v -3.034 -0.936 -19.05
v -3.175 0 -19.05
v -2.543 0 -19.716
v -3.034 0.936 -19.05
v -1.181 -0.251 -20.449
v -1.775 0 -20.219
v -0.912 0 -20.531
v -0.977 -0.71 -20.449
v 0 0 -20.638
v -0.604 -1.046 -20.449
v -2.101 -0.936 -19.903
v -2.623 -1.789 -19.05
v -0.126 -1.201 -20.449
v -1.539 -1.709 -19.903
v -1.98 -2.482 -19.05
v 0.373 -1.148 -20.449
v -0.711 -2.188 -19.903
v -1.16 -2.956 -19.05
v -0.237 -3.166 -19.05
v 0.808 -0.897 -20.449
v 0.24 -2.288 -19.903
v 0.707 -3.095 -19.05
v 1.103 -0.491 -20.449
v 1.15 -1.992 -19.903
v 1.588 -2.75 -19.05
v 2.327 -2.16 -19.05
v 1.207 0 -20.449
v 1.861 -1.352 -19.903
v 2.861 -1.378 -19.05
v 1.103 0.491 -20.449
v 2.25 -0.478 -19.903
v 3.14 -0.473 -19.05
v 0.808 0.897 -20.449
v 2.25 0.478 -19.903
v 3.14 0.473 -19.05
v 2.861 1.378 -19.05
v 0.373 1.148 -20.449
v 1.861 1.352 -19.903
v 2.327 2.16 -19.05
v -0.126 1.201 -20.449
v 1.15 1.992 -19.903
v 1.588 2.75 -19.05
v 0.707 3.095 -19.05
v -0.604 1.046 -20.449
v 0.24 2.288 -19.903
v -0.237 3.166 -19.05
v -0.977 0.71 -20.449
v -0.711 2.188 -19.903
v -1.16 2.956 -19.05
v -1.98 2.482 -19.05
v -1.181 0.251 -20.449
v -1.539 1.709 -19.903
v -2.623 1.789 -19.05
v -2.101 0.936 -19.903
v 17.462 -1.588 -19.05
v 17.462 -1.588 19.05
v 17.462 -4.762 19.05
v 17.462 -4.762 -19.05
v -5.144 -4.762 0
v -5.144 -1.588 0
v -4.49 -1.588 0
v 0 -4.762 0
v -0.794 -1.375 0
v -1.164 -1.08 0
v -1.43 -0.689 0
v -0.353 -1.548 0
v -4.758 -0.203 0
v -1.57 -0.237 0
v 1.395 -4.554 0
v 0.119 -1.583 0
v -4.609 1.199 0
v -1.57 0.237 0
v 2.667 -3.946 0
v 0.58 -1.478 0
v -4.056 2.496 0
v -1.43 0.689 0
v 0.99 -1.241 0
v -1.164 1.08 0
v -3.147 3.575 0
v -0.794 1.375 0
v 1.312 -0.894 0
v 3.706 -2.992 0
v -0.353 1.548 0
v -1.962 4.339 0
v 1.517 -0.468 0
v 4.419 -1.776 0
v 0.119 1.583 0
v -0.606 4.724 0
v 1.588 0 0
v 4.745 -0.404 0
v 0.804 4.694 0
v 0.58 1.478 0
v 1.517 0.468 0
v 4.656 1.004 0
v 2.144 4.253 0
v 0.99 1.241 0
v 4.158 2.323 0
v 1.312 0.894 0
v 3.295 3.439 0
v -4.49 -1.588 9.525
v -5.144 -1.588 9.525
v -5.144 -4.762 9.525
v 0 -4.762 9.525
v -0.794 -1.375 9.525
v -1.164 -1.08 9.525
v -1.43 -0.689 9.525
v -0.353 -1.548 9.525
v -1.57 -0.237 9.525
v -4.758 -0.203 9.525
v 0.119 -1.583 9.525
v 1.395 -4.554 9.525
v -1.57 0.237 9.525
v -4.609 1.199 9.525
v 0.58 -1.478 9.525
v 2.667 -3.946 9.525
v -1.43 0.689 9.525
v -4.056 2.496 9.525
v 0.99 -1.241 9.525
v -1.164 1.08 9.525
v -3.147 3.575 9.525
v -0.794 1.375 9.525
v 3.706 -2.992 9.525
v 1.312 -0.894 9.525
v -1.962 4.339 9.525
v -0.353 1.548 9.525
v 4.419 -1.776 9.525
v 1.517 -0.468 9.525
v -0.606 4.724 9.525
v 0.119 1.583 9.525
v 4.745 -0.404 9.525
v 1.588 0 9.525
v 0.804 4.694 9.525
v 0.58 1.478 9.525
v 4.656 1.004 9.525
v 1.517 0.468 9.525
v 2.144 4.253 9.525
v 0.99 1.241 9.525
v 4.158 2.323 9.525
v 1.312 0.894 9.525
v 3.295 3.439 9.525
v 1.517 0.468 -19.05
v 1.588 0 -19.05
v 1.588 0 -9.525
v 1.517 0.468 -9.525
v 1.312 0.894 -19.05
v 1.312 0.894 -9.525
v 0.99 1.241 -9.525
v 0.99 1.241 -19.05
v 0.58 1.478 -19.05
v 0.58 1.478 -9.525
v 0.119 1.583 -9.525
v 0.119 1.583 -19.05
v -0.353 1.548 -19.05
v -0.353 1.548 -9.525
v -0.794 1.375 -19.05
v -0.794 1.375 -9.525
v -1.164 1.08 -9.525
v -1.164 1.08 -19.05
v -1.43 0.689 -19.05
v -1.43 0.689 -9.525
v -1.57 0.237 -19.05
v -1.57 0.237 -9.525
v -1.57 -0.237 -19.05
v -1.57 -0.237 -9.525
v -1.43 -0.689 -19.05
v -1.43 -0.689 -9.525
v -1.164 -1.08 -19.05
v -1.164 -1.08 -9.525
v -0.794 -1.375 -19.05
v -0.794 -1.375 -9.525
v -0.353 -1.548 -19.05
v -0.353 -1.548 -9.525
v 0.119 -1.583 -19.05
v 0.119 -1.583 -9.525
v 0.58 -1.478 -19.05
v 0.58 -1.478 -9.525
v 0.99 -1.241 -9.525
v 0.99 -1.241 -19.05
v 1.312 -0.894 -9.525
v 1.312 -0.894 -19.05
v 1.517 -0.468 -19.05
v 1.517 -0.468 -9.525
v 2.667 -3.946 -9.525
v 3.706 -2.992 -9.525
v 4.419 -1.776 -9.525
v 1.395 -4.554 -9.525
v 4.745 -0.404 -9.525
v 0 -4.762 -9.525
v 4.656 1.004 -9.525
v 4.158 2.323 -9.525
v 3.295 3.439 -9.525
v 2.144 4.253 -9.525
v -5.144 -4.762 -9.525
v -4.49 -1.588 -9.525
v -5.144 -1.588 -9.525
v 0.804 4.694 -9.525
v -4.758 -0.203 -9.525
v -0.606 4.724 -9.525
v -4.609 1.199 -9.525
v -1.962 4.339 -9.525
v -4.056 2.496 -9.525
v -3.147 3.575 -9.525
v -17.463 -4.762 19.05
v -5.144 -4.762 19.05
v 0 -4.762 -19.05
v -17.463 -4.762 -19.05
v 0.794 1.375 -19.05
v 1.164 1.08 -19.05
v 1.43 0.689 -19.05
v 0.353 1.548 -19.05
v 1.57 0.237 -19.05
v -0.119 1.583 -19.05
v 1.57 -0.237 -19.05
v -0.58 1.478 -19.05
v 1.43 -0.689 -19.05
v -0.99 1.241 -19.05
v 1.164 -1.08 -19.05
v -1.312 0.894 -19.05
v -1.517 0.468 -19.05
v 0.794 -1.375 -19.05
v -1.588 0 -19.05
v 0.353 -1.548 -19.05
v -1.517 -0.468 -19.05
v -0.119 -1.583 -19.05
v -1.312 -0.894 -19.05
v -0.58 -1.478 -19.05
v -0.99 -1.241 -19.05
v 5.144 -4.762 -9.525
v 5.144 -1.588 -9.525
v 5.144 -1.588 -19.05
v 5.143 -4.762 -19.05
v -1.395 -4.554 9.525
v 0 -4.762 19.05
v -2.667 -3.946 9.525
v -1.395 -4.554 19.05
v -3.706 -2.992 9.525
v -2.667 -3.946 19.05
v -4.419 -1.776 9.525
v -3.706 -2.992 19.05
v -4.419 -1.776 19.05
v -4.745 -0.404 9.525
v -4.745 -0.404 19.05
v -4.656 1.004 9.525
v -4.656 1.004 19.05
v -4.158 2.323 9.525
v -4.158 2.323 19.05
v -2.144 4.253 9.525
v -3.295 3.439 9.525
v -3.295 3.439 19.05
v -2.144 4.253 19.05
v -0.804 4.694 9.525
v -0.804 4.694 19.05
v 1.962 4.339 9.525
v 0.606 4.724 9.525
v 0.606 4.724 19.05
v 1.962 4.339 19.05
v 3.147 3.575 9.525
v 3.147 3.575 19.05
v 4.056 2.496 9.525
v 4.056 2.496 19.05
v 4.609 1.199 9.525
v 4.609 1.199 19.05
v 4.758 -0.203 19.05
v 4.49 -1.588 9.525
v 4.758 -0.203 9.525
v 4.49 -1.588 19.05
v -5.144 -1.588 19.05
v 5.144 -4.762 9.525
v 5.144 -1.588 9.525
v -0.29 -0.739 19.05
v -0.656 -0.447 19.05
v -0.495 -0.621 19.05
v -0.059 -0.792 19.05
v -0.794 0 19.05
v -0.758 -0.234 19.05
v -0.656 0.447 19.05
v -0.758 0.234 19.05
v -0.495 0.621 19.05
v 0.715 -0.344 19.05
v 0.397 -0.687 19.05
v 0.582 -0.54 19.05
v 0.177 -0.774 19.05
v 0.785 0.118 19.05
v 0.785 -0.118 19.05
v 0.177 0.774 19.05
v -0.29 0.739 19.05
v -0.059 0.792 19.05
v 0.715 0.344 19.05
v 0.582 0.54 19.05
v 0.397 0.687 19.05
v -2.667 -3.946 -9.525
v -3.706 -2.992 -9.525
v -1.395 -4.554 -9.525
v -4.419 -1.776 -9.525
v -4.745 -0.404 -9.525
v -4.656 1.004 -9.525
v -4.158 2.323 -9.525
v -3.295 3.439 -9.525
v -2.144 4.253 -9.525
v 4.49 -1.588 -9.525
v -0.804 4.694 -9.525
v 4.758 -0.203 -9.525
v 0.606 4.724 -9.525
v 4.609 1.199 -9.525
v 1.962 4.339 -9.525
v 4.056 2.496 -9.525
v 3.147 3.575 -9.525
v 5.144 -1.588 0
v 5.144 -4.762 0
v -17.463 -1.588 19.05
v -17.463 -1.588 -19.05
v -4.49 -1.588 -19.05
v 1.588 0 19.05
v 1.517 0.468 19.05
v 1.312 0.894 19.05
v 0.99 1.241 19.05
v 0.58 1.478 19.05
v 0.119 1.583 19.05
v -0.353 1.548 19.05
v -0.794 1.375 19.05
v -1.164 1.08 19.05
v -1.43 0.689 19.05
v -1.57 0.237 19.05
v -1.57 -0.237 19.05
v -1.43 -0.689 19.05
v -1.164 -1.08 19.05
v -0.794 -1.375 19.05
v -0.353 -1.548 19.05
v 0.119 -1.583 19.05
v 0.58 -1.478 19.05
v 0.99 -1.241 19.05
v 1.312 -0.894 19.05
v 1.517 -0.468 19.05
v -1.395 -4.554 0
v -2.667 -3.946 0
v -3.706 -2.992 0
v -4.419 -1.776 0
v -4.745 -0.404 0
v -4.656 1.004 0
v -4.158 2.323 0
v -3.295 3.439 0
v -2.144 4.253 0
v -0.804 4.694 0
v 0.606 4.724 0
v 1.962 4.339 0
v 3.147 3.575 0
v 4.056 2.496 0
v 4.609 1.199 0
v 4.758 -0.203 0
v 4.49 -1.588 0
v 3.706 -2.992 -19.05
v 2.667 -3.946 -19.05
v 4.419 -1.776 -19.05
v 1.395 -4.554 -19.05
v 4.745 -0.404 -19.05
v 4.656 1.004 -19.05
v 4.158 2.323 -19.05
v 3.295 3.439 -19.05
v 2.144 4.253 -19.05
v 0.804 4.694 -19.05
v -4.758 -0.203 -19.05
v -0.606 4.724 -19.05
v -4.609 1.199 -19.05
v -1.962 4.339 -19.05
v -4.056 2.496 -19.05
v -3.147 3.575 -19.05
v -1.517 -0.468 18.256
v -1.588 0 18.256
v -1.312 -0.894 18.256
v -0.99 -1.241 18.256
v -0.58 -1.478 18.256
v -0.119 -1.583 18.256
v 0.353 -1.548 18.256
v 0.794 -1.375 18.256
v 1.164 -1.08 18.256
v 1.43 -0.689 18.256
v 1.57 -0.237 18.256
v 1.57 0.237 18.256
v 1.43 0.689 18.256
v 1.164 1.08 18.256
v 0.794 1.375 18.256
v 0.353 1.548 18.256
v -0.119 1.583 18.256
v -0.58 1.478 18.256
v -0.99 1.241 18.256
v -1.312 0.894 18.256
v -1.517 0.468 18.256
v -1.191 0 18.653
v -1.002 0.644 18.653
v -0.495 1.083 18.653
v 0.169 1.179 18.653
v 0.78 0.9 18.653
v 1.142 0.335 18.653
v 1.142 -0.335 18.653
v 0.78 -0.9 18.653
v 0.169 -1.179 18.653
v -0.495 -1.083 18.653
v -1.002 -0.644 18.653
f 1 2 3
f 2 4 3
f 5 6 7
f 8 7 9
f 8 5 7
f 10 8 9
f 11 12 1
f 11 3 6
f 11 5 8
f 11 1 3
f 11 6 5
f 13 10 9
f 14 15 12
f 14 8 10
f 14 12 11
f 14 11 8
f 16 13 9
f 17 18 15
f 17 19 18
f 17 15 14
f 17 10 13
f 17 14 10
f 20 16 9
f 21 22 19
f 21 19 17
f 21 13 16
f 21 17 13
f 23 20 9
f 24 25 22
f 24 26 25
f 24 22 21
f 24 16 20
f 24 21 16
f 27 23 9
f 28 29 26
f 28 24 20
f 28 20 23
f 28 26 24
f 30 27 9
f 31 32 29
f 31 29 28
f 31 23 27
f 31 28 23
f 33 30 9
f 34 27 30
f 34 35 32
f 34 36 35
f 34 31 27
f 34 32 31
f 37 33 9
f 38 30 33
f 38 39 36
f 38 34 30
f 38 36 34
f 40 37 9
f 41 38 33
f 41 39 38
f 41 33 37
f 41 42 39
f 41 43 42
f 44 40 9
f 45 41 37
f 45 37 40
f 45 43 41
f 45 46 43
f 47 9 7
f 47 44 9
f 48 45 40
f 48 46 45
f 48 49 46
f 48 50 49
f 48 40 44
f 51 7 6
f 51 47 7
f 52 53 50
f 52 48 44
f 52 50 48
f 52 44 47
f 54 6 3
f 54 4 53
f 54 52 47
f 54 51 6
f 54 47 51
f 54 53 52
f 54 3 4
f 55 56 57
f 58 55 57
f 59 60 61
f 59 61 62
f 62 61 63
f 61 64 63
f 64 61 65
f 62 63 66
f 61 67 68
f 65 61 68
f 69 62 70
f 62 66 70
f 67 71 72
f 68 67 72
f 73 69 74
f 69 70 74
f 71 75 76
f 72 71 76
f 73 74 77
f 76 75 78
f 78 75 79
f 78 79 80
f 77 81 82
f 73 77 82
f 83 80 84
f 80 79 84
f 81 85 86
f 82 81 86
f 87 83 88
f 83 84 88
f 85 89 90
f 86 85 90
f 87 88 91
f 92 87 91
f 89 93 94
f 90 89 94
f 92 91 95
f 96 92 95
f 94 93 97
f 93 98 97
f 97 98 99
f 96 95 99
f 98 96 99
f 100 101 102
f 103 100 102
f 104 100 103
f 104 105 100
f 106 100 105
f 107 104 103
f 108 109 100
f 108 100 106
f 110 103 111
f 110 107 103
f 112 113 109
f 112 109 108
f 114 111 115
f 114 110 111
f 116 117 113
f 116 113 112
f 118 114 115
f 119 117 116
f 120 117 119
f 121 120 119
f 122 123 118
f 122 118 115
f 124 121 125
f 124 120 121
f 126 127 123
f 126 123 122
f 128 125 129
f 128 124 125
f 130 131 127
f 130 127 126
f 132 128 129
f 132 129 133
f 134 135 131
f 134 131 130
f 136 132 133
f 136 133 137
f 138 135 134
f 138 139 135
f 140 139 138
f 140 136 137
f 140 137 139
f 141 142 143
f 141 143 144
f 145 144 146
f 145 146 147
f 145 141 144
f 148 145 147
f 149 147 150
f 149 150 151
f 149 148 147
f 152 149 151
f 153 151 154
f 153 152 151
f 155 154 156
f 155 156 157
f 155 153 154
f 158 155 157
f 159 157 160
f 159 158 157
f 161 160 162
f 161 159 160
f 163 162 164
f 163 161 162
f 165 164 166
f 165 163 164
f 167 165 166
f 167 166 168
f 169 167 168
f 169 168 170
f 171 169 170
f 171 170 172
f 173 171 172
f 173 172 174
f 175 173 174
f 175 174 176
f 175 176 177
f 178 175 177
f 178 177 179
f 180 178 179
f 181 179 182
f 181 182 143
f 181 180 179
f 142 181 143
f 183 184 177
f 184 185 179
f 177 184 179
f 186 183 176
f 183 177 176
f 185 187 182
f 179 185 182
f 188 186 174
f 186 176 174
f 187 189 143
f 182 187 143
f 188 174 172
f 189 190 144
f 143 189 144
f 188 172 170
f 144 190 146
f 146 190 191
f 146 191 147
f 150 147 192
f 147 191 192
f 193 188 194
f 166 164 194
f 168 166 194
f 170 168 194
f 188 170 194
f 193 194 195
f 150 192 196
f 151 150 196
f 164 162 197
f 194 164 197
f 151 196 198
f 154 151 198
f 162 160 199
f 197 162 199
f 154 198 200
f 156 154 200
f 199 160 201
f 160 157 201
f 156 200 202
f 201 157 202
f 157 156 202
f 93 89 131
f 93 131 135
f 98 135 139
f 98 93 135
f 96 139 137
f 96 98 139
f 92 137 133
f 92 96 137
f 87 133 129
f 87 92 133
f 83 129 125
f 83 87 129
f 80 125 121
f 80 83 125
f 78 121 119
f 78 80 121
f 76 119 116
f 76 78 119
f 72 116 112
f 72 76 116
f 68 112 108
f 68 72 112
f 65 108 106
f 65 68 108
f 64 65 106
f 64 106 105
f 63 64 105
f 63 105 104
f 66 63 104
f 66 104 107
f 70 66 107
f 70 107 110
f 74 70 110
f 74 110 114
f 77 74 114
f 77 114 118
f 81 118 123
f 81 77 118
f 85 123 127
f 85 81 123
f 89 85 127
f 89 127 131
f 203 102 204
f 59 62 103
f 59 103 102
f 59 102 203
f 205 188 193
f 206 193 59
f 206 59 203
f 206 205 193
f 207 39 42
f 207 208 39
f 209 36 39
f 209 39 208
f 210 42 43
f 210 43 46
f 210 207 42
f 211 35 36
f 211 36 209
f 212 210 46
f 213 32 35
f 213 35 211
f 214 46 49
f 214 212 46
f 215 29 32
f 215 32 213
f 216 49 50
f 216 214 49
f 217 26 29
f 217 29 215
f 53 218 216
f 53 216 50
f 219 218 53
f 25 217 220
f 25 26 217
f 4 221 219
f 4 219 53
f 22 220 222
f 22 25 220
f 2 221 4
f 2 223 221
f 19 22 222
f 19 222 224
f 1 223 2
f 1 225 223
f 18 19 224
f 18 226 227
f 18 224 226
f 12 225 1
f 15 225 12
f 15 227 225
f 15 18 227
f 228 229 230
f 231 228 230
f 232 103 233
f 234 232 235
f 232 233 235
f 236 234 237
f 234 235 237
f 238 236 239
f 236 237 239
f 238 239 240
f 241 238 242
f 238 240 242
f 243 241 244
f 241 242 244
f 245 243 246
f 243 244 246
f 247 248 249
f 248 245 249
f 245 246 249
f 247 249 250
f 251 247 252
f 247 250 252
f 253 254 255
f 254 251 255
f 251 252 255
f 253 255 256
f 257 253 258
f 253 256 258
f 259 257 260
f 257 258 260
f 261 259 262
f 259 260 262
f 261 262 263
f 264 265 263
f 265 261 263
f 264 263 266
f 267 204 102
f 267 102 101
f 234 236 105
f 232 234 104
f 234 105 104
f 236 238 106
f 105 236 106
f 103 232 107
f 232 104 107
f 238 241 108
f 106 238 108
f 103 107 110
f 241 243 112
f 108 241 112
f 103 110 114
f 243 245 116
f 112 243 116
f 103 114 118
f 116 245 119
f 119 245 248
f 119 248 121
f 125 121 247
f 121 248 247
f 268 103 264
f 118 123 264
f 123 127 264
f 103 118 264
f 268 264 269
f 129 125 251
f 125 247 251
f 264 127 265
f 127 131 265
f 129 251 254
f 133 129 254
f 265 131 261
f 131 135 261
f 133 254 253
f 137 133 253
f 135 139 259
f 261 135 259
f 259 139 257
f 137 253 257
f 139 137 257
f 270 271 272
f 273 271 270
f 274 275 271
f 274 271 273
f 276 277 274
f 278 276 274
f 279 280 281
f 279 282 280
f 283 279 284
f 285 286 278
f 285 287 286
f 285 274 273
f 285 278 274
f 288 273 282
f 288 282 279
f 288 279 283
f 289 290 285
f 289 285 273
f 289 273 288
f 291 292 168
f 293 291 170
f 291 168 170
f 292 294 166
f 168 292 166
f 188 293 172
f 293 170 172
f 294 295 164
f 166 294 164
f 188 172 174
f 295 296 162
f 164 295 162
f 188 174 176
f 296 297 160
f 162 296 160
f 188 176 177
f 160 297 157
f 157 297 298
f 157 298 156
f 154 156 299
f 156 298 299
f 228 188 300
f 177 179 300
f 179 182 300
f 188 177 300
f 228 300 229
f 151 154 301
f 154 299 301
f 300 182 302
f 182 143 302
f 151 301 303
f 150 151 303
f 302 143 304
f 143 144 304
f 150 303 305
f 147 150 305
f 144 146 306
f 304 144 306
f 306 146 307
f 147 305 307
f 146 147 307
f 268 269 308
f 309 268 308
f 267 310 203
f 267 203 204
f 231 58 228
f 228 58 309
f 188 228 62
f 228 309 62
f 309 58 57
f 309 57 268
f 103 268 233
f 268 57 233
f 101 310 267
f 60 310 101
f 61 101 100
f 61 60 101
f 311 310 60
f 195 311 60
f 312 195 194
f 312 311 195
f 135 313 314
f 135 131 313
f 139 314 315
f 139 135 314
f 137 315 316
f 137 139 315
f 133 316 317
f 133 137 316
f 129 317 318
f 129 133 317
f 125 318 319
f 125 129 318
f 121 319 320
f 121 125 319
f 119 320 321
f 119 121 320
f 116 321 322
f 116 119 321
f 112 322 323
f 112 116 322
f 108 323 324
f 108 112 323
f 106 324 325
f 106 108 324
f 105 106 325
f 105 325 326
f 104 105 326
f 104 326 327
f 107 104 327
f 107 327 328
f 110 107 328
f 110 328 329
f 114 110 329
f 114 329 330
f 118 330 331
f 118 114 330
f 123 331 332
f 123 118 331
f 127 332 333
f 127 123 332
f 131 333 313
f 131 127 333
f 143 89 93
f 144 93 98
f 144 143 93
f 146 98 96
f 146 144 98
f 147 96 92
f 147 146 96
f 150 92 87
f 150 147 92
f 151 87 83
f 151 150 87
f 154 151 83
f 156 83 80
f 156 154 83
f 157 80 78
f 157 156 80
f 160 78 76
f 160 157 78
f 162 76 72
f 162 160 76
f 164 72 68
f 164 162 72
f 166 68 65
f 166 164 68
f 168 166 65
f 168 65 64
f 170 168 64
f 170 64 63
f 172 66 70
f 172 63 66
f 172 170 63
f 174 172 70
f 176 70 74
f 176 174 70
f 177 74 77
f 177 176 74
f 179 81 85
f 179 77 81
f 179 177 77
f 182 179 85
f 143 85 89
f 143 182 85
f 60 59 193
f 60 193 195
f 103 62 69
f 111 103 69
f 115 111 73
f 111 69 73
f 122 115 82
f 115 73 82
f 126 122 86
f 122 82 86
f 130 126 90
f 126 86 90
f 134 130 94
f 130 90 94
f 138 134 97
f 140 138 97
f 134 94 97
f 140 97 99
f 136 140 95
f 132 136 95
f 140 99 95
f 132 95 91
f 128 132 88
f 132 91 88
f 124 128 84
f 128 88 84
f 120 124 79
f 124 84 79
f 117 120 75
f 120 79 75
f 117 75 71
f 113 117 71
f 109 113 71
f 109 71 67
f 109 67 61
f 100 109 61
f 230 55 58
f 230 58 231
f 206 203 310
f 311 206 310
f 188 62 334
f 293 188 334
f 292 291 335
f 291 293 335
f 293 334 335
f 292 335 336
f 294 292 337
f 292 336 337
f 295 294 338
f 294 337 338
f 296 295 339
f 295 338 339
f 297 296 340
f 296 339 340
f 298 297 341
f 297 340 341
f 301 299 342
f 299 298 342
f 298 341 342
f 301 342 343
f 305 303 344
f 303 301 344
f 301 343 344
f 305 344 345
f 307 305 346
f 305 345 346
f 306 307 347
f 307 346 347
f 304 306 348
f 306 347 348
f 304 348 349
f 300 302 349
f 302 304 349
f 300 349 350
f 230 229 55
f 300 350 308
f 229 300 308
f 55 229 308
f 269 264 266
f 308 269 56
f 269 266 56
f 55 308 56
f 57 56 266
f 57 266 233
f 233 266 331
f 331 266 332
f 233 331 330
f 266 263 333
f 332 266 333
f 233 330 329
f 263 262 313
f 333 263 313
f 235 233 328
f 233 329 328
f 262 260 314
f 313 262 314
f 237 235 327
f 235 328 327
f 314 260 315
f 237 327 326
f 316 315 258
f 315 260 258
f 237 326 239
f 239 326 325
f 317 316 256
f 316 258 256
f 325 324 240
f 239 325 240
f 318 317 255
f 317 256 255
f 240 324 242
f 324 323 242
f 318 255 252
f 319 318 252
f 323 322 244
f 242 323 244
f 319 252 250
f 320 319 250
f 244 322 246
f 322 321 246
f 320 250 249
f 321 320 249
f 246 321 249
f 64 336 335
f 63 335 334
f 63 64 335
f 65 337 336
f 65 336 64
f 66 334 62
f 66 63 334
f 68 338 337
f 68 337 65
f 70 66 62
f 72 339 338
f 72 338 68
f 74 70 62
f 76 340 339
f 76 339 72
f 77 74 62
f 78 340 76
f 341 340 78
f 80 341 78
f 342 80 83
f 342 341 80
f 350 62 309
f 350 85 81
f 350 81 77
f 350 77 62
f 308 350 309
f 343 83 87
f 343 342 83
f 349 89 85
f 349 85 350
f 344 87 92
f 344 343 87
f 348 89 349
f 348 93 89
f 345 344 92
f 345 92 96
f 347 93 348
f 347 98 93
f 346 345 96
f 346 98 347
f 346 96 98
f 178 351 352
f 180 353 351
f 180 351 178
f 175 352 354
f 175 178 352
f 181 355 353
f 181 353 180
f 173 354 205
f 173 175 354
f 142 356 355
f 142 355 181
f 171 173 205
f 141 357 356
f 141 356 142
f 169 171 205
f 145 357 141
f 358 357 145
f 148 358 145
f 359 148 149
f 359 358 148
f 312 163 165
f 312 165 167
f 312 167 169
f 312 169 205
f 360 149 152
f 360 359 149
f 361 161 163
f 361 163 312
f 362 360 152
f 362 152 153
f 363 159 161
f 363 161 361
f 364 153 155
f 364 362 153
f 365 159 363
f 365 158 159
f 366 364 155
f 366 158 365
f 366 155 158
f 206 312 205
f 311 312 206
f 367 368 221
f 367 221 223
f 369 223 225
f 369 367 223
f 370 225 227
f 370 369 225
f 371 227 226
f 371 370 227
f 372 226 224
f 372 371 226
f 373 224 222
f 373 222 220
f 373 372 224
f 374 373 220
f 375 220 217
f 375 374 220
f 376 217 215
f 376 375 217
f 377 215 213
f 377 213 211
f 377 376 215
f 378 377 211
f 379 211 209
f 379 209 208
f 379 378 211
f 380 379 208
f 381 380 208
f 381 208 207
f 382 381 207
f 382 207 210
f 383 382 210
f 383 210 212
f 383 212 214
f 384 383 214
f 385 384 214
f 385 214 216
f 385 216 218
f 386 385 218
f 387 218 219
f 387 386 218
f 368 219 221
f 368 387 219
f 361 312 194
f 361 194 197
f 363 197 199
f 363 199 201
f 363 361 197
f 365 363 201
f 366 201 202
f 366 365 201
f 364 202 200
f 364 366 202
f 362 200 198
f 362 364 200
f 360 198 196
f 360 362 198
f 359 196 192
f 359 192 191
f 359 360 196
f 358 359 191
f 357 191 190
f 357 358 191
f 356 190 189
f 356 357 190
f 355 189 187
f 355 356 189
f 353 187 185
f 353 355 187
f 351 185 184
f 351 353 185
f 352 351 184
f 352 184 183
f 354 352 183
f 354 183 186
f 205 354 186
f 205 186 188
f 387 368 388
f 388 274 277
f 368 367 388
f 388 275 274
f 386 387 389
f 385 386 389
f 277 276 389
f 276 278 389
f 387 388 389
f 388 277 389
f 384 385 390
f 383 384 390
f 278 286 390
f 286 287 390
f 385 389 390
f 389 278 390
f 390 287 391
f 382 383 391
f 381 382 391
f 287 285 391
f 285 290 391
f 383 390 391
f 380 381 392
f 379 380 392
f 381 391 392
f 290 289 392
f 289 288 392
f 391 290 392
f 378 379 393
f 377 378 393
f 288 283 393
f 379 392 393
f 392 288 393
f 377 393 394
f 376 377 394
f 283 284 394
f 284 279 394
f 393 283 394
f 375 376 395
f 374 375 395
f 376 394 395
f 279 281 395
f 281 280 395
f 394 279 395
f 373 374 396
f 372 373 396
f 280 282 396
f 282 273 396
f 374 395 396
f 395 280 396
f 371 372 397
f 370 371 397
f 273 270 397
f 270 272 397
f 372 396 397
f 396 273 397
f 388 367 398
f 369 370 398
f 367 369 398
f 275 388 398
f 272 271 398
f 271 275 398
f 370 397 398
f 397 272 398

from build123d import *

# Parameters (mm, degrees)
SKETCH1_R            = 1.5875
EXTRUDE1_DEPTH       = 19.05
SKETCH1_W            = 12.319
SKETCH1_H            = 3.175
EXTRUDE1_2_DEPTH     = 19.05
SKETCH10_W           = 10.287
SKETCH10_H           = 9.525
EXTRUDE6_DEPTH       = 5.7625
EXTRUDE6_DEPTH_BACK  = 5.7625
SKETCH11_R           = 1.5875
EXTRUDE7_DEPTH       = 9.525
SKETCH12_R           = 1.5875
EXTRUDE8_DEPTH       = 9.525
SKETCH19_W           = 34.925
SKETCH19_H           = 1.5875
EXTRUDE23_DEPTH      = 5.7625
EXTRUDE23_DEPTH_BACK = 5.7625
CHAMFER1_SIZE        = 0.79375


with BuildPart() as part:
    # Sketch1 → Extrude1 (new body, symmetric)
    with BuildSketch(Plane.XY):
        with BuildLine():
            Line((17.4625, -4.7625), (0, -4.7625))
            ThreePointArc((0, -4.7625), (-2.749630657, 3.888564967), (4.490128061, -1.5875))
            Line((4.490128061, -1.5875), (17.4625, -1.5875))
            Line((17.4625, -1.5875), (17.4625, -4.7625))
        make_face()
        Circle(SKETCH1_R, mode=Mode.SUBTRACT)
    extrude(amount=EXTRUDE1_DEPTH, both=True)

    # Sketch10 → Extrude6 (cut, two sides)
    with BuildSketch(Plane(origin=(0, 0, 0), x_dir=(1, 0, 0), z_dir=(0, 1, 0))) as extrude6_sk:
        with Locations((0, 14.2875)):
            Rectangle(SKETCH10_W, SKETCH10_H)
        with Locations((0, -4.7625)):
            Rectangle(SKETCH10_W, SKETCH10_H)
    extrude(amount=EXTRUDE6_DEPTH, mode=Mode.SUBTRACT)
    extrude(extrude6_sk.sketch, amount=-EXTRUDE6_DEPTH_BACK, mode=Mode.SUBTRACT)


with BuildPart() as body_2:
    # Sketch1 → Extrude1 2 (new body, symmetric)
    with BuildSketch(Plane.XY):
        with Locations((-11.303, -3.175)):
            Rectangle(SKETCH1_W, SKETCH1_H)
    extrude(amount=EXTRUDE1_2_DEPTH, both=True)

    # Sketch11 → Extrude7 (add)
    with BuildSketch(Plane.XY.offset(-19.05)):
        with BuildLine():
            Line((0, -4.7625), (-5.1435, -4.7625))
            Line((-5.1435, -4.7625), (-5.1435, -1.5875))
            Line((-5.1435, -1.5875), (-4.490128061, -1.5875))
            ThreePointArc((-4.490128061, -1.5875), (2.749630657, 3.888564967), (0, -4.7625))
        make_face()
        Circle(SKETCH11_R, mode=Mode.SUBTRACT)
    extrude(amount=EXTRUDE7_DEPTH)

    # Sketch12 → Extrude8 (add)
    with BuildSketch(Plane.XY):
        with BuildLine():
            Line((-5.1435, -4.7625), (0, -4.7625))
            ThreePointArc((0, -4.7625), (2.749630657, 3.888564967), (-4.490128061, -1.5875))
            Line((-4.490128061, -1.5875), (-5.1435, -1.5875))
            Line((-5.1435, -1.5875), (-5.1435, -4.7625))
        make_face()
        Circle(SKETCH12_R, mode=Mode.SUBTRACT)
    extrude(amount=EXTRUDE8_DEPTH)


with BuildPart() as body_3:
    # Sketch6 → Revolve1 (revolve)
    with BuildSketch(Plane(origin=(0, 0, 0), x_dir=(1, 0, 0), z_dir=(0, 1, 0))):
        with BuildLine():
            Line((-3.175, 19.05), (-1.5875, 19.05))
            Line((-1.5875, 19.05), (-1.5875, -19.05))
            Line((-1.5875, -19.05), (-3.175, -19.05))
            ThreePointArc((-3.175, -19.05), (-1.774878957, -20.218507914), (0, -20.6375))
            Line((0, -20.6375), (0, 20.6375))
            ThreePointArc((0, 20.6375), (-1.774878957, 20.218507914), (-3.175, 19.05))
        make_face()
    revolve(axis=Axis((0, 0, -20.6375), (0, 0, 1)))

    # Sketch19 → Extrude23 (cut, two sides)
    with BuildSketch(Plane(origin=(0, 0, 0), x_dir=(1, 0, 0), z_dir=(0, 1, 0))) as extrude23_sk:
        with Locations((0, -19.84375)):
            Rectangle(SKETCH19_W, SKETCH19_H)
    extrude(amount=EXTRUDE23_DEPTH, mode=Mode.SUBTRACT)
    extrude(extrude23_sk.sketch, amount=-EXTRUDE23_DEPTH_BACK, mode=Mode.SUBTRACT)

    # Chamfer1
    chamfer1_edges = [body_3.edges().sort_by_distance(p)[0] for p in [
        (1.5875, 0, 19.05),
    ]]
    chamfer(chamfer1_edges, length=CHAMFER1_SIZE)


solid = Compound([part.part, body_2.part, body_3.part])
